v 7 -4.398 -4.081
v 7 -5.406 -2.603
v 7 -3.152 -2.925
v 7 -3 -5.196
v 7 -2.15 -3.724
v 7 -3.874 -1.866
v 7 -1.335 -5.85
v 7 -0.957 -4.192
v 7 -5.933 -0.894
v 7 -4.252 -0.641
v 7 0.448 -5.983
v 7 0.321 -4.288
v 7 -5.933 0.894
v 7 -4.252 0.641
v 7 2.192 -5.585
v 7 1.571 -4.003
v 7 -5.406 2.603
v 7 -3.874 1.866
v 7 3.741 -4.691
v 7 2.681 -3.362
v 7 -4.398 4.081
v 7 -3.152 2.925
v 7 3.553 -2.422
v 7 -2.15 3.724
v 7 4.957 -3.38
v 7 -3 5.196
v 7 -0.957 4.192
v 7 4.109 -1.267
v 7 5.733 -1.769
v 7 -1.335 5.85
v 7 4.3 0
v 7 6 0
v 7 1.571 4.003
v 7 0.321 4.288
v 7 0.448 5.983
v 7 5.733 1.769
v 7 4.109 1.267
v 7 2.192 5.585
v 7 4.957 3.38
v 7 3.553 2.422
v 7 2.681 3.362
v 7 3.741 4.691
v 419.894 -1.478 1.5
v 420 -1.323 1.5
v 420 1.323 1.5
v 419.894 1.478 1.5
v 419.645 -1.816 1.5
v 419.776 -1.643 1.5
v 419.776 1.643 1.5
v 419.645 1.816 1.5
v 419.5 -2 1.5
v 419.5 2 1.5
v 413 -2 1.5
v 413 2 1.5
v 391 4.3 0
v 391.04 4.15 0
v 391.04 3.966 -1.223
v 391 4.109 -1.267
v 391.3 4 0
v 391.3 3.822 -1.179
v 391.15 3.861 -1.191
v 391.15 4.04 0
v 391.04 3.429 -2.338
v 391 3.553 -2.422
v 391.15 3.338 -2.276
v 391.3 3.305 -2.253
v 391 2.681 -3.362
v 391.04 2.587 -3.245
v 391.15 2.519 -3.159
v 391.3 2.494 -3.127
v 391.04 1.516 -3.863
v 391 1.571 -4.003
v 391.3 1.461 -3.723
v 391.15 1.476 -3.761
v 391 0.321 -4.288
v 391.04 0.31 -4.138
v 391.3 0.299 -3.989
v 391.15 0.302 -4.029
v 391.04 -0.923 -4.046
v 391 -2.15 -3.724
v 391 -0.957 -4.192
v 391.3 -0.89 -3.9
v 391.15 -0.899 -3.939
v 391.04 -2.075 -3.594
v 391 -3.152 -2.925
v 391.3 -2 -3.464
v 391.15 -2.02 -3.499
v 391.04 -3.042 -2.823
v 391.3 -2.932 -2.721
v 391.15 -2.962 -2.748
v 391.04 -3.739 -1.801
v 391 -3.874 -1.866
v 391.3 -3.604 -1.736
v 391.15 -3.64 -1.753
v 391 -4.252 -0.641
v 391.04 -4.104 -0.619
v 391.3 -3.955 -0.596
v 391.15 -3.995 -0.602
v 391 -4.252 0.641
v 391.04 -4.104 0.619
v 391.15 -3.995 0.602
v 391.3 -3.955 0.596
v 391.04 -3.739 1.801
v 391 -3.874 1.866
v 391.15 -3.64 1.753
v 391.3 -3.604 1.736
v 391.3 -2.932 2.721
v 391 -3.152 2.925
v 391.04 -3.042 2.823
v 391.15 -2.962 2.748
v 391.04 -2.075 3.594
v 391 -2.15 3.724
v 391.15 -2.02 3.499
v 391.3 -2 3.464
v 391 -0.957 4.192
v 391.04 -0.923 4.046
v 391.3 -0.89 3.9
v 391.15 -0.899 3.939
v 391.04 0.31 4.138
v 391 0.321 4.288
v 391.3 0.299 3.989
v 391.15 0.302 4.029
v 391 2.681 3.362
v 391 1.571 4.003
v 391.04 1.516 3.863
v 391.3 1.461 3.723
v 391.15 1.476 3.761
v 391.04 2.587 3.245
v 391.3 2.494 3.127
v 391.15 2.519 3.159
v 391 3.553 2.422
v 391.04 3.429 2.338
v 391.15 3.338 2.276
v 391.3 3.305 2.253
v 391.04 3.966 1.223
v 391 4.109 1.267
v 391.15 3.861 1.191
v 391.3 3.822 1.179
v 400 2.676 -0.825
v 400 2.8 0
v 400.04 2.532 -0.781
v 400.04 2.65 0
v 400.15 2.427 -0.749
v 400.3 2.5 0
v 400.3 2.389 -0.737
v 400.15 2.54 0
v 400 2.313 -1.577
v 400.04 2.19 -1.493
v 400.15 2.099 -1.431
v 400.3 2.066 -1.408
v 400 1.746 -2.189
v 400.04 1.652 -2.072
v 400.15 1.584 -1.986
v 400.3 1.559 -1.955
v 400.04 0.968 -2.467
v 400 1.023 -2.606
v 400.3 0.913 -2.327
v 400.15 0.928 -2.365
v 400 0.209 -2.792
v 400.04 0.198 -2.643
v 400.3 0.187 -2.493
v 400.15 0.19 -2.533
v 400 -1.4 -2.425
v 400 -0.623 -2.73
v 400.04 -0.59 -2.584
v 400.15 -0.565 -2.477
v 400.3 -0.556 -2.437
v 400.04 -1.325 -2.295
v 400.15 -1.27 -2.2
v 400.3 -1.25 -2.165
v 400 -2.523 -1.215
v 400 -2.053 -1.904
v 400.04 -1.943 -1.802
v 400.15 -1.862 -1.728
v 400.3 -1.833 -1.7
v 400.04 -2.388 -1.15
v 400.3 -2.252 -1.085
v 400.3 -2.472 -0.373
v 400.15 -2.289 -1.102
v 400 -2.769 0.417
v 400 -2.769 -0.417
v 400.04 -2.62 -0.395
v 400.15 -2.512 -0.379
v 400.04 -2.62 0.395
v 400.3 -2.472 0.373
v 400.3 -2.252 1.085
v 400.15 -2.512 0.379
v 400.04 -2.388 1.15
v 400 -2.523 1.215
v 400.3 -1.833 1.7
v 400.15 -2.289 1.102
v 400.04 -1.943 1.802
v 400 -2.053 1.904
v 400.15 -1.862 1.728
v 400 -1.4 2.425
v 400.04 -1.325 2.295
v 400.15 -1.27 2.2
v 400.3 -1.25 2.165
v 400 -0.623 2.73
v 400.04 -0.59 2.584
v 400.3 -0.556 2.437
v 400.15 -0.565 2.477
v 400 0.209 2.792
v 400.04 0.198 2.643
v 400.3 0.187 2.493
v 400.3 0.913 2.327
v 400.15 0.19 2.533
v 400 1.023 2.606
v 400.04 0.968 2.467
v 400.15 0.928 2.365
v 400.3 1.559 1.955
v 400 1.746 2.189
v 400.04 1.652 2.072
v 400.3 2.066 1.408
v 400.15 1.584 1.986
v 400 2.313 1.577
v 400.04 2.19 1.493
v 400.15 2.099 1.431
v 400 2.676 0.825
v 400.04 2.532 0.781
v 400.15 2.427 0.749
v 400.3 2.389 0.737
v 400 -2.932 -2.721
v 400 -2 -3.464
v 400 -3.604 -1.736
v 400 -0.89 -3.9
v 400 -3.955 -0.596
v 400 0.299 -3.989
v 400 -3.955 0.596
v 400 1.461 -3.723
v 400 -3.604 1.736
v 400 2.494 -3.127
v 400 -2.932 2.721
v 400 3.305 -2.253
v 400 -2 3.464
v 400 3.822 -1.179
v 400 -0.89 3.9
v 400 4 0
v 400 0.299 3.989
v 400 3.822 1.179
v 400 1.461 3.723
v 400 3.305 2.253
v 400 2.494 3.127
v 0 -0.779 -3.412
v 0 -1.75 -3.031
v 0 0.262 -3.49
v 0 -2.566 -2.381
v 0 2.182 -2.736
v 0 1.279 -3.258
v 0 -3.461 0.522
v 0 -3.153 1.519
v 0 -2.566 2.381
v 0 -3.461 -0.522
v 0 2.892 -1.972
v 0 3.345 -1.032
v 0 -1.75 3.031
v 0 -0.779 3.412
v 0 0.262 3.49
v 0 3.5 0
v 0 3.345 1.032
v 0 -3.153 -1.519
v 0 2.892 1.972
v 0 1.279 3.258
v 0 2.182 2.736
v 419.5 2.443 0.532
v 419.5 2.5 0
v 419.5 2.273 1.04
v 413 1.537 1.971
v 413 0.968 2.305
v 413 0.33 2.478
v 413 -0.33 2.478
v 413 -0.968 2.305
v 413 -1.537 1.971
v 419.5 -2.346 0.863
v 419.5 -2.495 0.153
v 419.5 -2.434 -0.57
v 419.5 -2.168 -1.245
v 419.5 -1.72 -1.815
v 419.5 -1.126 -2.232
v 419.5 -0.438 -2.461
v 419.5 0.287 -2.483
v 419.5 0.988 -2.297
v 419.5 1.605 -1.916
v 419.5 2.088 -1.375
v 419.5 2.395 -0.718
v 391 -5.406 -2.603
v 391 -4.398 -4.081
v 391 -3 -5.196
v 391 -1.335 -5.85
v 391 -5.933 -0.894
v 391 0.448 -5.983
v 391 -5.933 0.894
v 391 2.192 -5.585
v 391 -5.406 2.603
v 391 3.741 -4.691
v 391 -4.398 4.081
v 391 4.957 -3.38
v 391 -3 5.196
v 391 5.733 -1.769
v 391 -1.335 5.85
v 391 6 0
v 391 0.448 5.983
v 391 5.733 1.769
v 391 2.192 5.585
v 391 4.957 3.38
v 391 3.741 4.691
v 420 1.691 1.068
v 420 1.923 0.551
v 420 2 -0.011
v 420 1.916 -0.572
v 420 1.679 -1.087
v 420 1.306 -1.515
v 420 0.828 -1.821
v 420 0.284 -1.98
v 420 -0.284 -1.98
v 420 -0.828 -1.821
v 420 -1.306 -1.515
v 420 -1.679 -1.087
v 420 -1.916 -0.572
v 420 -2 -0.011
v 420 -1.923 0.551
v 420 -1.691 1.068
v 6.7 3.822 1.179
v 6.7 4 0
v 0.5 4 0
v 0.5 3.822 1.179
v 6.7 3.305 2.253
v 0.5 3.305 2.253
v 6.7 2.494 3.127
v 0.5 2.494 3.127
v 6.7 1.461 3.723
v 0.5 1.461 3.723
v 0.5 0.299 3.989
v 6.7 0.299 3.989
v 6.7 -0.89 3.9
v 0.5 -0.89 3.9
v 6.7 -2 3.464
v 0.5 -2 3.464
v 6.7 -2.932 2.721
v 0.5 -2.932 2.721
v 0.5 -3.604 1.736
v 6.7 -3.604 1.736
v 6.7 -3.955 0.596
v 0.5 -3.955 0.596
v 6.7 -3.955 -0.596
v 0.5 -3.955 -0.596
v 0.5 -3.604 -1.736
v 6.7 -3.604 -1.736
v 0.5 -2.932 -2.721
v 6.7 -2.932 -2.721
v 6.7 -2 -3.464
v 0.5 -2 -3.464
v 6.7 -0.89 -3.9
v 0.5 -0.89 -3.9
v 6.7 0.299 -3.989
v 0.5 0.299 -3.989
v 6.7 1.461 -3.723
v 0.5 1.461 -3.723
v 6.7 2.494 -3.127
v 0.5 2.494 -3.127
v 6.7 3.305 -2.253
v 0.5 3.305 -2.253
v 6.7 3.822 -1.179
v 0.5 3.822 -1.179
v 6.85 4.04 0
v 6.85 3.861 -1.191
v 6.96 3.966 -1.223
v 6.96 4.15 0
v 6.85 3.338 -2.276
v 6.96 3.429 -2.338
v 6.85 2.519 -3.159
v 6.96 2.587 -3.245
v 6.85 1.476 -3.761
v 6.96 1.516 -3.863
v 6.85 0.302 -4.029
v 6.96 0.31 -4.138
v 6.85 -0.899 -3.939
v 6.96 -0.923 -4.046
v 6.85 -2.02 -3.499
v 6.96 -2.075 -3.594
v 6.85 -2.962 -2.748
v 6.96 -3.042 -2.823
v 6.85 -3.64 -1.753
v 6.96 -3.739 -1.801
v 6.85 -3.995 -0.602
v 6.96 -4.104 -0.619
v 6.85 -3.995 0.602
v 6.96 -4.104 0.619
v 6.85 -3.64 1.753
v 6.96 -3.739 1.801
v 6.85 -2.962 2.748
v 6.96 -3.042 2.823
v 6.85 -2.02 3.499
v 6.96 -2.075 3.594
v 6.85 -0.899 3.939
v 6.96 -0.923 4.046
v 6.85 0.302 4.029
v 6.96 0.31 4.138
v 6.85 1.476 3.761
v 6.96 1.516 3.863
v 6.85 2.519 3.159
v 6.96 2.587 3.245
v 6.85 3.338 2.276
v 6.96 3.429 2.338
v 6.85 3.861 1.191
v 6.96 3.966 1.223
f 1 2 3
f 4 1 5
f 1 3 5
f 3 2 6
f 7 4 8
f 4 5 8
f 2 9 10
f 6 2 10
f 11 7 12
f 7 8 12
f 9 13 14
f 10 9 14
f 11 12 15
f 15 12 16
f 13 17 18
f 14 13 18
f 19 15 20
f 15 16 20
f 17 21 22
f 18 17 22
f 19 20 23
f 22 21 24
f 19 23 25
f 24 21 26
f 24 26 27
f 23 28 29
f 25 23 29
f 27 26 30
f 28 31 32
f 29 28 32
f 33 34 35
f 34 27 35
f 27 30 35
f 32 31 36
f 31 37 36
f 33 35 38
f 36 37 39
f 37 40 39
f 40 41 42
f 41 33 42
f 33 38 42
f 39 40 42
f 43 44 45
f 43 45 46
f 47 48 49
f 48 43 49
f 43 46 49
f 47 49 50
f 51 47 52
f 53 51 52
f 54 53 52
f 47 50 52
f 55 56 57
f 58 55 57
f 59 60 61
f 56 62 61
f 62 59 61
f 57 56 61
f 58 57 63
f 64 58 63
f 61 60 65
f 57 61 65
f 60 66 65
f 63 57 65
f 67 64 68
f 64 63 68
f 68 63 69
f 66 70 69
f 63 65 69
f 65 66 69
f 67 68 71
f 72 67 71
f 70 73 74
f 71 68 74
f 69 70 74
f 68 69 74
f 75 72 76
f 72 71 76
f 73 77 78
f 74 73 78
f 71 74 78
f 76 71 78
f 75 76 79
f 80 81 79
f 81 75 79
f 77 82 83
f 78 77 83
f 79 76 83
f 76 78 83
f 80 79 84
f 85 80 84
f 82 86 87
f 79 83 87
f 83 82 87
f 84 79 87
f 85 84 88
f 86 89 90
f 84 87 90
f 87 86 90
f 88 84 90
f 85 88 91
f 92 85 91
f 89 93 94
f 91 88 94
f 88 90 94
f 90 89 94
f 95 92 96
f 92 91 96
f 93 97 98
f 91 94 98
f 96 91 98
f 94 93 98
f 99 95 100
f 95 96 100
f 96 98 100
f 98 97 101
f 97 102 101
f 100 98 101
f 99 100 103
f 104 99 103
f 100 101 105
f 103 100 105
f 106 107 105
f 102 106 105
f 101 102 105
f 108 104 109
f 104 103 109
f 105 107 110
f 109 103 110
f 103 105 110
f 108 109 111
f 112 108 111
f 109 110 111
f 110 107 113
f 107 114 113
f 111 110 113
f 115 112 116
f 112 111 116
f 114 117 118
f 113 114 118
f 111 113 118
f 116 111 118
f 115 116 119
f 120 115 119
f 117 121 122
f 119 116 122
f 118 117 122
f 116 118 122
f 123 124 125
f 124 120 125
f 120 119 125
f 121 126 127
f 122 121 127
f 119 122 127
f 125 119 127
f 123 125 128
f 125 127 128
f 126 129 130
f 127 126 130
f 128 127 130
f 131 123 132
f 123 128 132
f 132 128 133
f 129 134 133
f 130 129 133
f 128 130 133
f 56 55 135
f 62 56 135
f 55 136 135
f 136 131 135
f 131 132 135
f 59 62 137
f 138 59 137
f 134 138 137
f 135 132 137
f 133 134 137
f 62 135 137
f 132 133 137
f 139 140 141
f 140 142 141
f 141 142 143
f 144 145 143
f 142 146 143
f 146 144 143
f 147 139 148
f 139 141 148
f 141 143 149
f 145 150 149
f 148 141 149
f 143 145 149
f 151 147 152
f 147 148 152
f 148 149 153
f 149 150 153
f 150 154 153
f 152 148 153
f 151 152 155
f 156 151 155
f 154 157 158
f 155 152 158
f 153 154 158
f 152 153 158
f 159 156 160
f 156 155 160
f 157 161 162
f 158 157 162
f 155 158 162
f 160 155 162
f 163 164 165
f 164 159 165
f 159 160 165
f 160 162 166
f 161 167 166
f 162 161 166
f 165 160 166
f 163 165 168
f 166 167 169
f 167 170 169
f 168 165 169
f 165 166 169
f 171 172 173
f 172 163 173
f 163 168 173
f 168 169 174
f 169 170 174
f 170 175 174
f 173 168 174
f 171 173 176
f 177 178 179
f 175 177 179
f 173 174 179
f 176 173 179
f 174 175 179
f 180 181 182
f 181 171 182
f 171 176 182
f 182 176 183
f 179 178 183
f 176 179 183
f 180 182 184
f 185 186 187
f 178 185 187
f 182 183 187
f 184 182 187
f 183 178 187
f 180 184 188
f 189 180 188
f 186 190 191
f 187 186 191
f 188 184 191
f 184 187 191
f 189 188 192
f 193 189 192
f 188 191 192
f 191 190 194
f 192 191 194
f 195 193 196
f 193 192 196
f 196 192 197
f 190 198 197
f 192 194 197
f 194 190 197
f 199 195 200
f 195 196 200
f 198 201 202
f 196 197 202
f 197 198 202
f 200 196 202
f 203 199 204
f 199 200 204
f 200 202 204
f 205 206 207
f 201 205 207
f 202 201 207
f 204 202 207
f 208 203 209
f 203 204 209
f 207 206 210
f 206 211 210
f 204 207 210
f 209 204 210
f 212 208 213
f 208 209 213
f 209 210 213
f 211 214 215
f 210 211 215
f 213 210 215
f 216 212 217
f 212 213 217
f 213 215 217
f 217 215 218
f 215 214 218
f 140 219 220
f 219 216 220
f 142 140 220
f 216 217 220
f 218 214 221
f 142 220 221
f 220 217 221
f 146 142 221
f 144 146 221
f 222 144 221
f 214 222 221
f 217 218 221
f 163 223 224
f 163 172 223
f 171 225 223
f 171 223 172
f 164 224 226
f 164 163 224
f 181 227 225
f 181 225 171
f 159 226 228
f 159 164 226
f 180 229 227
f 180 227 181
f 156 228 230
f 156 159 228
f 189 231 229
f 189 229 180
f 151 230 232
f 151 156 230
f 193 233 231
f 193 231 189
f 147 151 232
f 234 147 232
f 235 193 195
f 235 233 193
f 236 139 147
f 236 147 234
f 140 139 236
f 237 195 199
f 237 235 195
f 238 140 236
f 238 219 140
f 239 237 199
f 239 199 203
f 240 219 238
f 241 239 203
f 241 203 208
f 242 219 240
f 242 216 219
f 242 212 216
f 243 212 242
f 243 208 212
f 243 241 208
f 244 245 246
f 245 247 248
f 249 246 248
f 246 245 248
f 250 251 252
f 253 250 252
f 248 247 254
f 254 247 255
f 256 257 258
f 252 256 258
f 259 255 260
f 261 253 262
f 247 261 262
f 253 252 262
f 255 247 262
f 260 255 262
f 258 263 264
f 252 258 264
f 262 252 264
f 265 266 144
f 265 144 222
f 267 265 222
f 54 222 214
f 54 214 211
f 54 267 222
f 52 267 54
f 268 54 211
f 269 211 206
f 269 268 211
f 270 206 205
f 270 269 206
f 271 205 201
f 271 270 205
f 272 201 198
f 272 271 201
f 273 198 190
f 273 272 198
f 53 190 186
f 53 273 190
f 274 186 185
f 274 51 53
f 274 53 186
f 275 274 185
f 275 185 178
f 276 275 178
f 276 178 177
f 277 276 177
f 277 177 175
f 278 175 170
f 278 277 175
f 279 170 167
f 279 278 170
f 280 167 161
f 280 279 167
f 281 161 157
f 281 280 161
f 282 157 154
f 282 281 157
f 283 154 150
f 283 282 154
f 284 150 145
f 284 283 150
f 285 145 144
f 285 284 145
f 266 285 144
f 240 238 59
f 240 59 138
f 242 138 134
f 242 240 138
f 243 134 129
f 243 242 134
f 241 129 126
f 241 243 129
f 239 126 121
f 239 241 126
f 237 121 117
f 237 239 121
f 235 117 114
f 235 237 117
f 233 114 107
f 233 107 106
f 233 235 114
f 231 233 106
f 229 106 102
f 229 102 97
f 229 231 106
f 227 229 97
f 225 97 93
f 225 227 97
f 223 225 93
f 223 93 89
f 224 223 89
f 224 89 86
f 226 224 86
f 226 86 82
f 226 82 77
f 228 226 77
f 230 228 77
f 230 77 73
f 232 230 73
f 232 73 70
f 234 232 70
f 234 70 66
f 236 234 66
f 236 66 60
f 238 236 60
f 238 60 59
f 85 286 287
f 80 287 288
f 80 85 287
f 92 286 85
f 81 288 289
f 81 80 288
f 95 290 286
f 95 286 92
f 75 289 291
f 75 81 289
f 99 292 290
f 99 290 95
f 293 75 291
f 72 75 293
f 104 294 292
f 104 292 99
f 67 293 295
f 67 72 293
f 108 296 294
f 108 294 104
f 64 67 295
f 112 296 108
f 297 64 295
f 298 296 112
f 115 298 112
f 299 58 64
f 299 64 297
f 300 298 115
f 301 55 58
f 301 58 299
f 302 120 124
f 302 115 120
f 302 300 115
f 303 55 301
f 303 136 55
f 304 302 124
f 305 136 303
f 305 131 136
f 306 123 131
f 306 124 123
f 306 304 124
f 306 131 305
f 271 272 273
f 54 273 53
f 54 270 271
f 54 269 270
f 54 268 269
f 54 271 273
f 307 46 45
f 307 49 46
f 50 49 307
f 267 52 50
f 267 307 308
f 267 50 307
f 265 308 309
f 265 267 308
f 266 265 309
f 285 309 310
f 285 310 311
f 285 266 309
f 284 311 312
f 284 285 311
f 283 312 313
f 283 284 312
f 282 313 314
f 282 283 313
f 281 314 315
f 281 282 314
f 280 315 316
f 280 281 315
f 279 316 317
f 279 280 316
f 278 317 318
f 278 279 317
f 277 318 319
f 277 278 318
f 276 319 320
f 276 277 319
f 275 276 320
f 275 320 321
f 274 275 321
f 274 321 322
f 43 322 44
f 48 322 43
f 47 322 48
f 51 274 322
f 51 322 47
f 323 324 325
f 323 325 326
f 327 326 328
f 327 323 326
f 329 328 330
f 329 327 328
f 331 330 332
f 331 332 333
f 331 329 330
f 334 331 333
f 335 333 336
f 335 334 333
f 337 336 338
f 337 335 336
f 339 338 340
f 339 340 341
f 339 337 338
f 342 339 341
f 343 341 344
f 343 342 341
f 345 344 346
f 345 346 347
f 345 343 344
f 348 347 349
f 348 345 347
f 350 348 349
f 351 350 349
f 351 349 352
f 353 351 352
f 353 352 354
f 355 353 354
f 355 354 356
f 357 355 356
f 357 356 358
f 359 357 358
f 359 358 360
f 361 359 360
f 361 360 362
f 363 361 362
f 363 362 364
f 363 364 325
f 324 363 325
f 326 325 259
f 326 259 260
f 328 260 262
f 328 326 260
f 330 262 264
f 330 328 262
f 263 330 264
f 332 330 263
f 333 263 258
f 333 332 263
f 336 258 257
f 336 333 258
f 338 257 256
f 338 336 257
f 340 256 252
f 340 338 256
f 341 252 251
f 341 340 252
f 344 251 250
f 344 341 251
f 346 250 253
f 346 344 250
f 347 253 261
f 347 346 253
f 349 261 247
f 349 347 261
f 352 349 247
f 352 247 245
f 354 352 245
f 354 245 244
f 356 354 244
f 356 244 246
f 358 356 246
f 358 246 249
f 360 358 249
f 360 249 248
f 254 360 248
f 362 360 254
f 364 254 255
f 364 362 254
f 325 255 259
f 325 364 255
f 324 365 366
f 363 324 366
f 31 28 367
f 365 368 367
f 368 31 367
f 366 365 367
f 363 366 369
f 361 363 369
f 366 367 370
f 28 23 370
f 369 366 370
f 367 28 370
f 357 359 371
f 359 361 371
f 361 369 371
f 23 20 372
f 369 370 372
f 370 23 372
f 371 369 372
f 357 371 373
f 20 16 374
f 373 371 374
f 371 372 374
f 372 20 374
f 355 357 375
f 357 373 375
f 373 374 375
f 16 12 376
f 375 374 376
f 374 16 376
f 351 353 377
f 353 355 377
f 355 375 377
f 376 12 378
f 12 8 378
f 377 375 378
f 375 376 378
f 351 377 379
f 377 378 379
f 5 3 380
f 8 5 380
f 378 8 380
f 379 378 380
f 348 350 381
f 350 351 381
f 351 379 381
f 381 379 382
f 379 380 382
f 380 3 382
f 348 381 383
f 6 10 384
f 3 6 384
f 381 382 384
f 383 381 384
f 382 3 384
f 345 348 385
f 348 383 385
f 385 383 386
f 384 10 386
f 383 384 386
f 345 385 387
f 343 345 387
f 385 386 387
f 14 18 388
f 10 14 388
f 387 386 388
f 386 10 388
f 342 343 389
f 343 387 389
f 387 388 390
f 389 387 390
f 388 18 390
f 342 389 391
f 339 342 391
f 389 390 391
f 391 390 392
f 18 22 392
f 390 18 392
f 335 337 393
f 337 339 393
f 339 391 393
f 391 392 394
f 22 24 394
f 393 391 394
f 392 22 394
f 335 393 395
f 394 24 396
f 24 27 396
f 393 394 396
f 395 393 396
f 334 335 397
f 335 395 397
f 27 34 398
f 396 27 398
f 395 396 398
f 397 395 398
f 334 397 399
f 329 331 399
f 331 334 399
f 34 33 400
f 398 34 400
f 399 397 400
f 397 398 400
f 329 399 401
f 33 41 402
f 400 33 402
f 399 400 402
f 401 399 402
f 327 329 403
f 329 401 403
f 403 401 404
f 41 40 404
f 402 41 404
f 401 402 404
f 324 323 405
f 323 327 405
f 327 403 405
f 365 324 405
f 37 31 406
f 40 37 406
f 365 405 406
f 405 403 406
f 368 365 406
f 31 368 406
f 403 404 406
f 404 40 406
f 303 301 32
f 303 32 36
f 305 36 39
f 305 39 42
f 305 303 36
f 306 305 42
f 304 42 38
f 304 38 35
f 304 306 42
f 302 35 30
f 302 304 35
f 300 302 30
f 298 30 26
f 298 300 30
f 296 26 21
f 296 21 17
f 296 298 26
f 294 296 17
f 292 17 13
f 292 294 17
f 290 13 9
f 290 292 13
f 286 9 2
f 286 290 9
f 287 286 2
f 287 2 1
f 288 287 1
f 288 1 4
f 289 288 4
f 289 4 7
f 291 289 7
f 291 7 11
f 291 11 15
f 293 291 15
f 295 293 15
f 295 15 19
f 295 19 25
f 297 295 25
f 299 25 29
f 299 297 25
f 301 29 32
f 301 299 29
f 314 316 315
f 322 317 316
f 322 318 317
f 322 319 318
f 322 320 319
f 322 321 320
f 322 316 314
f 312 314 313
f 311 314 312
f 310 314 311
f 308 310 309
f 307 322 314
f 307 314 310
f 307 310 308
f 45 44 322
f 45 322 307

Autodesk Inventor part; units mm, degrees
ref_plane "YZ Plane" through (0, 0, 0) normal (1, 0, 0) x (0, 1, 0)
ref_plane "XZ Plane" through (0, 0, 0) normal (0, 1, 0) x (-1, 0, 0)
ref_plane "XY Plane" through (0, 0, 0) normal (0, 0, 1) x (1, 0, 0)
sketch "Sketch_16" plane through (0, 0, 0) normal (0, 0, 1) x (1, 0, 0)
  line L0 (391, 0) -> (7, 0)
  line L1 (7, 0) -> (7, 6)
  line L2 (7, 6) -> (391, 6)
  line L3 (391, 6) -> (391, 0)
  line L4 (391, 0) -> (7, 0)
revolve "Revolution1" add sketch "Sketch_16" angle 360 about axis through (391, 0, 0) along (1, 0, 0)
thread "Thread1" size "TR12x2" class "7e" standard "ISO Metric Trapezoidal Threads" full length
sketch "Sketch_23" plane through (0, 0, 0) normal (0, 0, 1) x (1, 0, 0)
  line L0 (7, 0) -> (0, 0)
  line L1 (0, 0) -> (0, 3.5)
  line L2 (0, 3.5) -> (0.5, 4)
  line L3 (0.5, 4) -> (6.7, 4)
  arc A0 (6.7, 4) -> (7, 4.3) centre (6.7, 4.3) ccw
  line L4 (7, 4.3) -> (7, 0)
  line L5 (7, 0) -> (0, 0)
revolve "Revolution2" add sketch "Sketch_23" angle 360 about axis through (7, 0, 0) along (1, 0, 0)
sketch "Sketch_4" plane through (0, 0, 0) normal (0, 0, 1) x (1, 0, 0)
  line L0 (420, 0) -> (391, 0)
  line L1 (391, 0) -> (391, 4.3)
  arc A0 (391, 4.3) -> (391.3, 4) centre (391.3, 4.3) ccw
  line L2 (391.3, 4) -> (400, 4)
  line L3 (400, 4) -> (400, 2.8)
  arc A1 (400, 2.8) -> (400.3, 2.5) centre (400.3, 2.8) ccw
  line L4 (400.3, 2.5) -> (419.5, 2.5)
  line L5 (419.5, 2.5) -> (420, 2)
  line L6 (420, 2) -> (420, 0)
  line L7 (420, 0) -> (391, 0)
revolve "Revolution3" add sketch "Sketch_4" angle 360 about axis through (420, 0, 0) along (1, 0, 0)
sketch "Sketch_8" plane through (420, 0, 0) normal (1, 0, 0) x (0, 0, -1)
  line L0 (-2.5, -6) -> (-1.5, -6)
  line L1 (-1.5, -6) -> (-1.5, 6)
  line L2 (-1.5, 6) -> (-2.5, 6)
  line L3 (-2.5, 6) -> (-2.5, -6)
extrude "Extrusion1" cut sketch "Sketch_8" against normal blind 7
properties part number "MTSBRK12-420-F7-R8-T9-Q8-S20-E5-FE0-FW7-FY1" material "Steel, Carbon"
